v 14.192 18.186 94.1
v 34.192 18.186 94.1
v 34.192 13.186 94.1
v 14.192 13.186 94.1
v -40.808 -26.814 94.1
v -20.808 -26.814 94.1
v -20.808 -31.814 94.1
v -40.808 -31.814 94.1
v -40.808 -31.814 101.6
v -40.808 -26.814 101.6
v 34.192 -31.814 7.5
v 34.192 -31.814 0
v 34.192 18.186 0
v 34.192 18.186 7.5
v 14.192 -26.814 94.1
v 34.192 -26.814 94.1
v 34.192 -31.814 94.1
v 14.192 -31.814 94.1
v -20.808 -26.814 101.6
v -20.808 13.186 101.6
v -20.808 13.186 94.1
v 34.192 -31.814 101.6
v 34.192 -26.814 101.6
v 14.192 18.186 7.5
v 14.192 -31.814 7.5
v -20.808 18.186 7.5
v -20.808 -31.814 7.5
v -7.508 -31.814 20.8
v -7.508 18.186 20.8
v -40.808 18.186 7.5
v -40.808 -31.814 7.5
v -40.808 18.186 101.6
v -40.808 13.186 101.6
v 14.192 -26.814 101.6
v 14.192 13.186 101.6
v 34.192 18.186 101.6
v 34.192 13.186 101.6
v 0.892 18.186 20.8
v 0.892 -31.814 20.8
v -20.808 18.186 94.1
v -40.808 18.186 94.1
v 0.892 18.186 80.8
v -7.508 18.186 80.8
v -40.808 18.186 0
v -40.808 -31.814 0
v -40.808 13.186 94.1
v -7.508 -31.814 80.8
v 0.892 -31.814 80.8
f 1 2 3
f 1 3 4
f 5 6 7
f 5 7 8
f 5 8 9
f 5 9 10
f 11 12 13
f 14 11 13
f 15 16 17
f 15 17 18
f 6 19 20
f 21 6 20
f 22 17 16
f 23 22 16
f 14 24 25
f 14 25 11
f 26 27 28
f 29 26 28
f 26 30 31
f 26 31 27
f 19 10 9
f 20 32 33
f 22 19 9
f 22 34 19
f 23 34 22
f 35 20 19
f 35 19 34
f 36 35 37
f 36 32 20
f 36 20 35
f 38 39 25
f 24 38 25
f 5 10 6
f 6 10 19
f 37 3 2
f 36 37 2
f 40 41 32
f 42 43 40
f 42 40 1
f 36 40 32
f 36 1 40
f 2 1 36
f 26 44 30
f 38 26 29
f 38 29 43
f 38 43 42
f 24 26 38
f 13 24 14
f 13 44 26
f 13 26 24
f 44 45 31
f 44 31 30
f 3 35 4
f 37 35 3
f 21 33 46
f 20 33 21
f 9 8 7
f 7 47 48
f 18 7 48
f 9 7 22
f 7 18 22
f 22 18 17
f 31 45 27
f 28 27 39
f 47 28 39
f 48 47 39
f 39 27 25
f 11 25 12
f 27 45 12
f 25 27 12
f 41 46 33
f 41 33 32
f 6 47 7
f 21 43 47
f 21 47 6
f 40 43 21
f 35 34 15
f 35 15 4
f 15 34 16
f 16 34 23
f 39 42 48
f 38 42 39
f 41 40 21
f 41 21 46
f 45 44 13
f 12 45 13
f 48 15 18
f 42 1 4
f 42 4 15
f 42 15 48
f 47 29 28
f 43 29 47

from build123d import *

# Parameters (mm, degrees)
SKETCH2_W           = 75
SKETCH2_H           = 50
BOSS_EXTRUDE1_DEPTH = 101.6
CUT_EXTRUDE1_DEPTH  = 101.6
CUT_EXTRUDE2_DEPTH  = 101.6
SKETCH5_W           = 20
SKETCH5_H           = 40
CUT_EXTRUDE3_DEPTH  = 10
SKETCH6_W           = 20
SKETCH6_H           = 40
CUT_EXTRUDE4_DEPTH  = 10


with BuildPart() as part:
    # Sketch2 → Boss-Extrude1 (new body)
    with BuildSketch(Plane.XY):
        with Locations((-3.307692308, -6.81353022)):
            Rectangle(SKETCH2_W, SKETCH2_H)
    extrude(amount=BOSS_EXTRUDE1_DEPTH)

    # Sketch3 → Cut-Extrude1 (cut)
    with BuildSketch(Plane(origin=(0, 18.18646978, 0), x_dir=(1, 0, 0), z_dir=(0, 1, 0))):
        Polygon((-40.807692308, -7.5), (-20.807692308, -7.5), (-7.507692308, -20.8), (-7.507692308, -80.8), (-20.807692308, -94.1), (-40.807692308, -94.1), align=None)
    extrude(amount=-CUT_EXTRUDE1_DEPTH, mode=Mode.SUBTRACT)

    # Sketch4 → Cut-Extrude2 (cut)
    with BuildSketch(Plane(origin=(0, 18.18646978, 0), x_dir=(1, 0, 0), z_dir=(0, 1, 0))):
        Polygon((34.192307692, -94.1), (14.192307692, -94.1), (0.892307692, -80.8), (0.892307692, -20.8), (14.192307692, -7.5), (34.192307692, -7.5), align=None)
    extrude(amount=-CUT_EXTRUDE2_DEPTH, mode=Mode.SUBTRACT)

    # Sketch5 → Cut-Extrude3 (cut)
    with BuildSketch(Plane.XY.offset(101.6)):
        with Locations((24.192307692, -6.81353022)):
            Rectangle(SKETCH5_W, SKETCH5_H)
    extrude(amount=-CUT_EXTRUDE3_DEPTH, mode=Mode.SUBTRACT)

    # Sketch6 → Cut-Extrude4 (cut)
    with BuildSketch(Plane.XY.offset(101.6)):
        with Locations((-30.807692308, -6.81353022)):
            Rectangle(SKETCH6_W, SKETCH6_H)
    extrude(amount=-CUT_EXTRUDE4_DEPTH, mode=Mode.SUBTRACT)


solid = part.part
